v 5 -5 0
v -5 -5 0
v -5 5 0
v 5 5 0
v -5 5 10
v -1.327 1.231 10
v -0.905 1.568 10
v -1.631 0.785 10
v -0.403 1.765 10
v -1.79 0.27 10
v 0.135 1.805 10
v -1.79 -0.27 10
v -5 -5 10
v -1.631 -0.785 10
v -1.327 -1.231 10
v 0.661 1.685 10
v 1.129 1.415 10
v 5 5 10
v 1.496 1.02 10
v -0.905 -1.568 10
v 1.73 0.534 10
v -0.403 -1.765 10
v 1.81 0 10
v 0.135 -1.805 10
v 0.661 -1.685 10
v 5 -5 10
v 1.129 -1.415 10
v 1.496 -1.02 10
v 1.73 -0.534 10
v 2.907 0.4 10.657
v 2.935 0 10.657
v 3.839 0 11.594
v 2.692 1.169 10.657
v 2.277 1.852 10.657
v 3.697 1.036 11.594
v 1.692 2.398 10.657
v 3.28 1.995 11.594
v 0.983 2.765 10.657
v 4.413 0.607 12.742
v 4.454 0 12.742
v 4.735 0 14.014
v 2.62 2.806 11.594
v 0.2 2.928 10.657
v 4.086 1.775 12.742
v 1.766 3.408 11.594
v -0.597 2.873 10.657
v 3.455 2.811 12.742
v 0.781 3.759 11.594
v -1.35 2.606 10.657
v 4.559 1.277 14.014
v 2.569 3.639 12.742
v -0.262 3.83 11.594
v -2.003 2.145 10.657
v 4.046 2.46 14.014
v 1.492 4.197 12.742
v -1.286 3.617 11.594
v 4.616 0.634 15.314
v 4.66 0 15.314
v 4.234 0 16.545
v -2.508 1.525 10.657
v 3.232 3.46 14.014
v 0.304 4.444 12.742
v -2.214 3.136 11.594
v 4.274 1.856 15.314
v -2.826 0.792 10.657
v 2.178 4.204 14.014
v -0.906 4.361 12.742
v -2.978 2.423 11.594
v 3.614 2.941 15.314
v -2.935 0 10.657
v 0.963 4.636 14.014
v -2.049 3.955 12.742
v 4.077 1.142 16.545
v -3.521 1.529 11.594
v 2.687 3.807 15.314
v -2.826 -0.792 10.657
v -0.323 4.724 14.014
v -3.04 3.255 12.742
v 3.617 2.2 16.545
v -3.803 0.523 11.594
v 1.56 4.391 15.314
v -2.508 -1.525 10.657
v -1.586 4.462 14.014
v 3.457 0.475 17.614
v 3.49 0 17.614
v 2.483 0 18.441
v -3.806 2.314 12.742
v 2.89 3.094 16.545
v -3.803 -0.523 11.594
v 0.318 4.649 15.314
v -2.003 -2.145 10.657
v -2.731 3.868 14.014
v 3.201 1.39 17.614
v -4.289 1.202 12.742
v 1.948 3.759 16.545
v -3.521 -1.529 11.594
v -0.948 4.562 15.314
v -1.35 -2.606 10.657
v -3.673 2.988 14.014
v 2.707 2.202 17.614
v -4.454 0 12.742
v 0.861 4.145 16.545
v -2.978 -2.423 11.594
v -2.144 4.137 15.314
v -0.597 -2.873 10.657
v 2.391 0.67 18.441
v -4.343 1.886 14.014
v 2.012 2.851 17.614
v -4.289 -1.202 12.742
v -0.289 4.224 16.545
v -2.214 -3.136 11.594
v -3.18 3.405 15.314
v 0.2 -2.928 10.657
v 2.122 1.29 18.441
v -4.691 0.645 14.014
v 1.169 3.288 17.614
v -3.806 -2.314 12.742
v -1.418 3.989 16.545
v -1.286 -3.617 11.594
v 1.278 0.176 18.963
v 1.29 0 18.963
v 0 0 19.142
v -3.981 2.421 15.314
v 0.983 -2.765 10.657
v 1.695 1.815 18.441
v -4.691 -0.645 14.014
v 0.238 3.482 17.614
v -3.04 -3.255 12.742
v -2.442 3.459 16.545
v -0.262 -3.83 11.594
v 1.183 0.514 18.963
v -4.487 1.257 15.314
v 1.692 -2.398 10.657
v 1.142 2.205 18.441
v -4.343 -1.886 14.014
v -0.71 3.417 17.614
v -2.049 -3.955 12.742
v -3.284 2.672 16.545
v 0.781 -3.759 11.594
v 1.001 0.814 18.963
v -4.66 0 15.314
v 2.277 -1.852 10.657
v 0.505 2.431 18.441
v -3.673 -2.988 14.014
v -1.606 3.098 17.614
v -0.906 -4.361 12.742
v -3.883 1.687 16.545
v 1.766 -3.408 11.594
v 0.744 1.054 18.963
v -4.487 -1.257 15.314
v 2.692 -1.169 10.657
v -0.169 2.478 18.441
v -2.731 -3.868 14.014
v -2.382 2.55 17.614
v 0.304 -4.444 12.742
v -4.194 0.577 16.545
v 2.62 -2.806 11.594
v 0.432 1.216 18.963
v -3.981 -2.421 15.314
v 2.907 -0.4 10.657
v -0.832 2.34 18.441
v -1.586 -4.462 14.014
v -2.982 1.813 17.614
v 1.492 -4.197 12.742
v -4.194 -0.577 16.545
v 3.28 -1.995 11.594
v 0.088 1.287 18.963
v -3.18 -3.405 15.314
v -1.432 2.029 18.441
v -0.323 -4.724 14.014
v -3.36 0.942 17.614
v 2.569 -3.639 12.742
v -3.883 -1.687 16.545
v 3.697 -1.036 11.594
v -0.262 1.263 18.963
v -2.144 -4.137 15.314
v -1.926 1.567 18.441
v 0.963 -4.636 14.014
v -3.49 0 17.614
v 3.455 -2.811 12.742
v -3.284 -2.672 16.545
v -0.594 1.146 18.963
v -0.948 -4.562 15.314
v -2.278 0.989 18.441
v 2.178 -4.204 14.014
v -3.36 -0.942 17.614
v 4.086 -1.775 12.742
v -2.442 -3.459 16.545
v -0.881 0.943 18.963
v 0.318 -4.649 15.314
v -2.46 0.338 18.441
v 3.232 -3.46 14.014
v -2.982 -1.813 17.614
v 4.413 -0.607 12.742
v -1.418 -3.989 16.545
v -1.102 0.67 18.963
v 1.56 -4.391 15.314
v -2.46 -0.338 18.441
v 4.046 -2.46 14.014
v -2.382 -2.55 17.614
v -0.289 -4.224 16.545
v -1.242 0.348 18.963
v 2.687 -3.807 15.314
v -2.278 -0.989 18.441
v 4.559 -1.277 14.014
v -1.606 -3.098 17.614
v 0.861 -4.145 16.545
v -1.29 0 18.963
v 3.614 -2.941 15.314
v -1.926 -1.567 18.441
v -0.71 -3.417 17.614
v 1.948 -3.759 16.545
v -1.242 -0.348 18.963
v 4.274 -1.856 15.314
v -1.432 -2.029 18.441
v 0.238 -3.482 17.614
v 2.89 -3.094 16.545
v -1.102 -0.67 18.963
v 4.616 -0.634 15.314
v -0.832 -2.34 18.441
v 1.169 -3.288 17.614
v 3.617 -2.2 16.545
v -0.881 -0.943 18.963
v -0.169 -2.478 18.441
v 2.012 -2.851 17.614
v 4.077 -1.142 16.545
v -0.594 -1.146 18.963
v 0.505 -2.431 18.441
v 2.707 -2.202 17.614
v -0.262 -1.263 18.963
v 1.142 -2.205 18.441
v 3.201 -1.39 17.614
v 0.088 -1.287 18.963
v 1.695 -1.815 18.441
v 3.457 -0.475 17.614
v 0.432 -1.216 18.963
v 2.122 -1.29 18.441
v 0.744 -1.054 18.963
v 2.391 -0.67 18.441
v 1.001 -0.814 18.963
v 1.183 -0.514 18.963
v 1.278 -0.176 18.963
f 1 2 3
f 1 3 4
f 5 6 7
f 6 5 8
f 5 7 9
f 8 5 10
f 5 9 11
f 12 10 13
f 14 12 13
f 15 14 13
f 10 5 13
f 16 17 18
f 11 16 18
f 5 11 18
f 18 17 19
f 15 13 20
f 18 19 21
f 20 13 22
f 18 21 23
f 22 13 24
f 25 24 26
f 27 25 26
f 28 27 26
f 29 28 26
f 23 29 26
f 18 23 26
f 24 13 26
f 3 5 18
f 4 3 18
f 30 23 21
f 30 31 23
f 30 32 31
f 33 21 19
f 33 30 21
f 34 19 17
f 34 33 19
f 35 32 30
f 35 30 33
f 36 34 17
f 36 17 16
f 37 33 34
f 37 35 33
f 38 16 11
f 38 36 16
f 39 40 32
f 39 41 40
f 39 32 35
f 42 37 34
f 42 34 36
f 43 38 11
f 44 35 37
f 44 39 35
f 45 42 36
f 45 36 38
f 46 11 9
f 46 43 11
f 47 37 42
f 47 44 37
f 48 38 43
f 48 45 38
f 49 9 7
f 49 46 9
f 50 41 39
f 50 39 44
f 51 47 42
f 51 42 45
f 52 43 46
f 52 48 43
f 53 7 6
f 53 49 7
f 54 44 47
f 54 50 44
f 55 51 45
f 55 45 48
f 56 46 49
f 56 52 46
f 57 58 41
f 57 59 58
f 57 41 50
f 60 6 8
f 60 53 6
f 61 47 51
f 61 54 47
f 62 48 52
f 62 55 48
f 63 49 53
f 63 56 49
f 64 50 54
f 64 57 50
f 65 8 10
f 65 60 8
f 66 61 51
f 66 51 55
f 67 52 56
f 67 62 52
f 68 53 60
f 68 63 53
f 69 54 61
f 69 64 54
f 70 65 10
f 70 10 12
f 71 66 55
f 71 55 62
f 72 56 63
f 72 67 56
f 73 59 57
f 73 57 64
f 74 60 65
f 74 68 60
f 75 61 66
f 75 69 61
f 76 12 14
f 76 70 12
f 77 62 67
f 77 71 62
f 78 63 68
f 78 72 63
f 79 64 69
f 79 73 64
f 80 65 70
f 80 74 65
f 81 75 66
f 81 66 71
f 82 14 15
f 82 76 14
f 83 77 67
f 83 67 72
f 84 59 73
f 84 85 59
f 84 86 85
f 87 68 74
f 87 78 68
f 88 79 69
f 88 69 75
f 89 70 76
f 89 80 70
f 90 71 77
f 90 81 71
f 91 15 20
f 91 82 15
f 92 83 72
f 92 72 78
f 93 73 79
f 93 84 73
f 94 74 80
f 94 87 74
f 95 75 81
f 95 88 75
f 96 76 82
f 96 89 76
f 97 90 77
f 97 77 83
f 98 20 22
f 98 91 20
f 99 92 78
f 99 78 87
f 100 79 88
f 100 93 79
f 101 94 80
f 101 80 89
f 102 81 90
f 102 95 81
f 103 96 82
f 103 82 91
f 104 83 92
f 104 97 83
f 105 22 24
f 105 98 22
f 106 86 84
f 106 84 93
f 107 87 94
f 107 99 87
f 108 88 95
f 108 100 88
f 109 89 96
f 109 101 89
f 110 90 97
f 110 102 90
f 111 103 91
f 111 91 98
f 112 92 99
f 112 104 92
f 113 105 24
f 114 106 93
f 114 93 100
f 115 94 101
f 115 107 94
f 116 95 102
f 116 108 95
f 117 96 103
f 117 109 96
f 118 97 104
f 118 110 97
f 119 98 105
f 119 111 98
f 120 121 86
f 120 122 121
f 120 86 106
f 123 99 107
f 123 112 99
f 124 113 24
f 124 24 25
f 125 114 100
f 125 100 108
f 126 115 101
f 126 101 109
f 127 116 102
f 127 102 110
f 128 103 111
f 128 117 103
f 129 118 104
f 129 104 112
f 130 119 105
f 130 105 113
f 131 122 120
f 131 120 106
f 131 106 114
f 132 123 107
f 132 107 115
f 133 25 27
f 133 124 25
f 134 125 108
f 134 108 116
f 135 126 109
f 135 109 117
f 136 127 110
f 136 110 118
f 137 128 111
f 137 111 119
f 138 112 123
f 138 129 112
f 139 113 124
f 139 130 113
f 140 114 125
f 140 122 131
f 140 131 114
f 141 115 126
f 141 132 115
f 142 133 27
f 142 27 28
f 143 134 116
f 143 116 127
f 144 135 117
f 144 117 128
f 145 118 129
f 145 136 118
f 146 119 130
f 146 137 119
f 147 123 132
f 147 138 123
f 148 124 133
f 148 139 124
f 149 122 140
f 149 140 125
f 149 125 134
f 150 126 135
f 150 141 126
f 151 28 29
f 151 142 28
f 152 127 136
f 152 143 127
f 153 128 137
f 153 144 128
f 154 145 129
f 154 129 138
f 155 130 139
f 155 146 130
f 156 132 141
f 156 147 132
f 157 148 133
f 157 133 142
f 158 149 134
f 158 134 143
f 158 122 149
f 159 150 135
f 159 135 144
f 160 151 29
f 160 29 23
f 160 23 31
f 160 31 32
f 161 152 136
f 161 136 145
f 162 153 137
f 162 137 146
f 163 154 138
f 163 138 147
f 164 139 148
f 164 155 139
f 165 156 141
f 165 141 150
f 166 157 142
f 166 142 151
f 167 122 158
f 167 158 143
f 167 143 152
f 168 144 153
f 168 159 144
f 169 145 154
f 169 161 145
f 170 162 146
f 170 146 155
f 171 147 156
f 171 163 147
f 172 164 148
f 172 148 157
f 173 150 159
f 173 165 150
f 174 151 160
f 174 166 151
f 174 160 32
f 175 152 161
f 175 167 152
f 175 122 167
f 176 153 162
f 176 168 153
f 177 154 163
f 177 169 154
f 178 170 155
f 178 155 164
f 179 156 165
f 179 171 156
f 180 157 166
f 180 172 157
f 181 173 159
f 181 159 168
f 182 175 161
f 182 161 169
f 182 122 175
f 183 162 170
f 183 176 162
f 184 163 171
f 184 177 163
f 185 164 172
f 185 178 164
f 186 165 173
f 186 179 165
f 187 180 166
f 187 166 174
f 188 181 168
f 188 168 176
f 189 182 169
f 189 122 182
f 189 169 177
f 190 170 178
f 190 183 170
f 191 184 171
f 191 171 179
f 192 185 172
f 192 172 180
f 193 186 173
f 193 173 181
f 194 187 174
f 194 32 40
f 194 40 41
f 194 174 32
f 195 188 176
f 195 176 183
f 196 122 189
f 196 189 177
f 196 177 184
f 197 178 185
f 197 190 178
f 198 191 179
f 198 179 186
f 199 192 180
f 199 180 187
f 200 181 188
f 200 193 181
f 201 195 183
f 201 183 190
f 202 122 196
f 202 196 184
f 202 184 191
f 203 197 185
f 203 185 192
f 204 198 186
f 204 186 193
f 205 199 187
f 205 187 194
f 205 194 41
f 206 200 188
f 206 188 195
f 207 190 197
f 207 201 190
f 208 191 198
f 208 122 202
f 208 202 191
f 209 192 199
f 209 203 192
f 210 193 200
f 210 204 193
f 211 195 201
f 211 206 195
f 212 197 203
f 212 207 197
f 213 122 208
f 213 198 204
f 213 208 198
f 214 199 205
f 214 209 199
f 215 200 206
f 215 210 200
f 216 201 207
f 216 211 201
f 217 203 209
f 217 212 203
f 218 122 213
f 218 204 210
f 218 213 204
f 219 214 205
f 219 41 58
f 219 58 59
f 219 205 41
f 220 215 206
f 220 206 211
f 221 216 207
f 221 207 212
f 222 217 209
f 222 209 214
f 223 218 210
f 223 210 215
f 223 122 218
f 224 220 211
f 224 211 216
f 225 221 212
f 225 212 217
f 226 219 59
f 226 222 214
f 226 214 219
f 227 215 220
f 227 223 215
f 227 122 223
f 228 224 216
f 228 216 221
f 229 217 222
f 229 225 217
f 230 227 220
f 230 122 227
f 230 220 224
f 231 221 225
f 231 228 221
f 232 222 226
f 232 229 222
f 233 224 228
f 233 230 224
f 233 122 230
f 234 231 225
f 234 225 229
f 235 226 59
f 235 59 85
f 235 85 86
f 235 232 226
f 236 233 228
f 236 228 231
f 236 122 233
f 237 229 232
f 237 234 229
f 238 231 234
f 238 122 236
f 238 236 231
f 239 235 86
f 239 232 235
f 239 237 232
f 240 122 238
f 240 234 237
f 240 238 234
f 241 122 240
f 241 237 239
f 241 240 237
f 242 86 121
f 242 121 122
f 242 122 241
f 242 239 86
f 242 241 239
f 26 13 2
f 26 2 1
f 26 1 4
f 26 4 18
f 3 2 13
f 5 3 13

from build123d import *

# Parameters (mm, degrees)
SKETCH_W  = 10
SKETCH_H  = 10
PAD_DEPTH = 5


with BuildPart() as part:
    # Sketch → Pad (new body, symmetric)
    with BuildSketch(Plane.XZ):
        with Locations((0, 5)):
            Rectangle(SKETCH_W, SKETCH_H)
    extrude(amount=PAD_DEPTH, both=True)

    # Sketch001 → Revolution (revolve)
    with BuildSketch(Plane.XZ):
        with BuildLine():
            ThreePointArc((0, 9.64162), (4.75, 14.39162), (0, 19.14162))
            Line((0, 19.14162), (0, 9.64162))
        make_face()
    revolve(axis=Axis((0, 0, 0), (0, 0, 1)))


solid = part.part
